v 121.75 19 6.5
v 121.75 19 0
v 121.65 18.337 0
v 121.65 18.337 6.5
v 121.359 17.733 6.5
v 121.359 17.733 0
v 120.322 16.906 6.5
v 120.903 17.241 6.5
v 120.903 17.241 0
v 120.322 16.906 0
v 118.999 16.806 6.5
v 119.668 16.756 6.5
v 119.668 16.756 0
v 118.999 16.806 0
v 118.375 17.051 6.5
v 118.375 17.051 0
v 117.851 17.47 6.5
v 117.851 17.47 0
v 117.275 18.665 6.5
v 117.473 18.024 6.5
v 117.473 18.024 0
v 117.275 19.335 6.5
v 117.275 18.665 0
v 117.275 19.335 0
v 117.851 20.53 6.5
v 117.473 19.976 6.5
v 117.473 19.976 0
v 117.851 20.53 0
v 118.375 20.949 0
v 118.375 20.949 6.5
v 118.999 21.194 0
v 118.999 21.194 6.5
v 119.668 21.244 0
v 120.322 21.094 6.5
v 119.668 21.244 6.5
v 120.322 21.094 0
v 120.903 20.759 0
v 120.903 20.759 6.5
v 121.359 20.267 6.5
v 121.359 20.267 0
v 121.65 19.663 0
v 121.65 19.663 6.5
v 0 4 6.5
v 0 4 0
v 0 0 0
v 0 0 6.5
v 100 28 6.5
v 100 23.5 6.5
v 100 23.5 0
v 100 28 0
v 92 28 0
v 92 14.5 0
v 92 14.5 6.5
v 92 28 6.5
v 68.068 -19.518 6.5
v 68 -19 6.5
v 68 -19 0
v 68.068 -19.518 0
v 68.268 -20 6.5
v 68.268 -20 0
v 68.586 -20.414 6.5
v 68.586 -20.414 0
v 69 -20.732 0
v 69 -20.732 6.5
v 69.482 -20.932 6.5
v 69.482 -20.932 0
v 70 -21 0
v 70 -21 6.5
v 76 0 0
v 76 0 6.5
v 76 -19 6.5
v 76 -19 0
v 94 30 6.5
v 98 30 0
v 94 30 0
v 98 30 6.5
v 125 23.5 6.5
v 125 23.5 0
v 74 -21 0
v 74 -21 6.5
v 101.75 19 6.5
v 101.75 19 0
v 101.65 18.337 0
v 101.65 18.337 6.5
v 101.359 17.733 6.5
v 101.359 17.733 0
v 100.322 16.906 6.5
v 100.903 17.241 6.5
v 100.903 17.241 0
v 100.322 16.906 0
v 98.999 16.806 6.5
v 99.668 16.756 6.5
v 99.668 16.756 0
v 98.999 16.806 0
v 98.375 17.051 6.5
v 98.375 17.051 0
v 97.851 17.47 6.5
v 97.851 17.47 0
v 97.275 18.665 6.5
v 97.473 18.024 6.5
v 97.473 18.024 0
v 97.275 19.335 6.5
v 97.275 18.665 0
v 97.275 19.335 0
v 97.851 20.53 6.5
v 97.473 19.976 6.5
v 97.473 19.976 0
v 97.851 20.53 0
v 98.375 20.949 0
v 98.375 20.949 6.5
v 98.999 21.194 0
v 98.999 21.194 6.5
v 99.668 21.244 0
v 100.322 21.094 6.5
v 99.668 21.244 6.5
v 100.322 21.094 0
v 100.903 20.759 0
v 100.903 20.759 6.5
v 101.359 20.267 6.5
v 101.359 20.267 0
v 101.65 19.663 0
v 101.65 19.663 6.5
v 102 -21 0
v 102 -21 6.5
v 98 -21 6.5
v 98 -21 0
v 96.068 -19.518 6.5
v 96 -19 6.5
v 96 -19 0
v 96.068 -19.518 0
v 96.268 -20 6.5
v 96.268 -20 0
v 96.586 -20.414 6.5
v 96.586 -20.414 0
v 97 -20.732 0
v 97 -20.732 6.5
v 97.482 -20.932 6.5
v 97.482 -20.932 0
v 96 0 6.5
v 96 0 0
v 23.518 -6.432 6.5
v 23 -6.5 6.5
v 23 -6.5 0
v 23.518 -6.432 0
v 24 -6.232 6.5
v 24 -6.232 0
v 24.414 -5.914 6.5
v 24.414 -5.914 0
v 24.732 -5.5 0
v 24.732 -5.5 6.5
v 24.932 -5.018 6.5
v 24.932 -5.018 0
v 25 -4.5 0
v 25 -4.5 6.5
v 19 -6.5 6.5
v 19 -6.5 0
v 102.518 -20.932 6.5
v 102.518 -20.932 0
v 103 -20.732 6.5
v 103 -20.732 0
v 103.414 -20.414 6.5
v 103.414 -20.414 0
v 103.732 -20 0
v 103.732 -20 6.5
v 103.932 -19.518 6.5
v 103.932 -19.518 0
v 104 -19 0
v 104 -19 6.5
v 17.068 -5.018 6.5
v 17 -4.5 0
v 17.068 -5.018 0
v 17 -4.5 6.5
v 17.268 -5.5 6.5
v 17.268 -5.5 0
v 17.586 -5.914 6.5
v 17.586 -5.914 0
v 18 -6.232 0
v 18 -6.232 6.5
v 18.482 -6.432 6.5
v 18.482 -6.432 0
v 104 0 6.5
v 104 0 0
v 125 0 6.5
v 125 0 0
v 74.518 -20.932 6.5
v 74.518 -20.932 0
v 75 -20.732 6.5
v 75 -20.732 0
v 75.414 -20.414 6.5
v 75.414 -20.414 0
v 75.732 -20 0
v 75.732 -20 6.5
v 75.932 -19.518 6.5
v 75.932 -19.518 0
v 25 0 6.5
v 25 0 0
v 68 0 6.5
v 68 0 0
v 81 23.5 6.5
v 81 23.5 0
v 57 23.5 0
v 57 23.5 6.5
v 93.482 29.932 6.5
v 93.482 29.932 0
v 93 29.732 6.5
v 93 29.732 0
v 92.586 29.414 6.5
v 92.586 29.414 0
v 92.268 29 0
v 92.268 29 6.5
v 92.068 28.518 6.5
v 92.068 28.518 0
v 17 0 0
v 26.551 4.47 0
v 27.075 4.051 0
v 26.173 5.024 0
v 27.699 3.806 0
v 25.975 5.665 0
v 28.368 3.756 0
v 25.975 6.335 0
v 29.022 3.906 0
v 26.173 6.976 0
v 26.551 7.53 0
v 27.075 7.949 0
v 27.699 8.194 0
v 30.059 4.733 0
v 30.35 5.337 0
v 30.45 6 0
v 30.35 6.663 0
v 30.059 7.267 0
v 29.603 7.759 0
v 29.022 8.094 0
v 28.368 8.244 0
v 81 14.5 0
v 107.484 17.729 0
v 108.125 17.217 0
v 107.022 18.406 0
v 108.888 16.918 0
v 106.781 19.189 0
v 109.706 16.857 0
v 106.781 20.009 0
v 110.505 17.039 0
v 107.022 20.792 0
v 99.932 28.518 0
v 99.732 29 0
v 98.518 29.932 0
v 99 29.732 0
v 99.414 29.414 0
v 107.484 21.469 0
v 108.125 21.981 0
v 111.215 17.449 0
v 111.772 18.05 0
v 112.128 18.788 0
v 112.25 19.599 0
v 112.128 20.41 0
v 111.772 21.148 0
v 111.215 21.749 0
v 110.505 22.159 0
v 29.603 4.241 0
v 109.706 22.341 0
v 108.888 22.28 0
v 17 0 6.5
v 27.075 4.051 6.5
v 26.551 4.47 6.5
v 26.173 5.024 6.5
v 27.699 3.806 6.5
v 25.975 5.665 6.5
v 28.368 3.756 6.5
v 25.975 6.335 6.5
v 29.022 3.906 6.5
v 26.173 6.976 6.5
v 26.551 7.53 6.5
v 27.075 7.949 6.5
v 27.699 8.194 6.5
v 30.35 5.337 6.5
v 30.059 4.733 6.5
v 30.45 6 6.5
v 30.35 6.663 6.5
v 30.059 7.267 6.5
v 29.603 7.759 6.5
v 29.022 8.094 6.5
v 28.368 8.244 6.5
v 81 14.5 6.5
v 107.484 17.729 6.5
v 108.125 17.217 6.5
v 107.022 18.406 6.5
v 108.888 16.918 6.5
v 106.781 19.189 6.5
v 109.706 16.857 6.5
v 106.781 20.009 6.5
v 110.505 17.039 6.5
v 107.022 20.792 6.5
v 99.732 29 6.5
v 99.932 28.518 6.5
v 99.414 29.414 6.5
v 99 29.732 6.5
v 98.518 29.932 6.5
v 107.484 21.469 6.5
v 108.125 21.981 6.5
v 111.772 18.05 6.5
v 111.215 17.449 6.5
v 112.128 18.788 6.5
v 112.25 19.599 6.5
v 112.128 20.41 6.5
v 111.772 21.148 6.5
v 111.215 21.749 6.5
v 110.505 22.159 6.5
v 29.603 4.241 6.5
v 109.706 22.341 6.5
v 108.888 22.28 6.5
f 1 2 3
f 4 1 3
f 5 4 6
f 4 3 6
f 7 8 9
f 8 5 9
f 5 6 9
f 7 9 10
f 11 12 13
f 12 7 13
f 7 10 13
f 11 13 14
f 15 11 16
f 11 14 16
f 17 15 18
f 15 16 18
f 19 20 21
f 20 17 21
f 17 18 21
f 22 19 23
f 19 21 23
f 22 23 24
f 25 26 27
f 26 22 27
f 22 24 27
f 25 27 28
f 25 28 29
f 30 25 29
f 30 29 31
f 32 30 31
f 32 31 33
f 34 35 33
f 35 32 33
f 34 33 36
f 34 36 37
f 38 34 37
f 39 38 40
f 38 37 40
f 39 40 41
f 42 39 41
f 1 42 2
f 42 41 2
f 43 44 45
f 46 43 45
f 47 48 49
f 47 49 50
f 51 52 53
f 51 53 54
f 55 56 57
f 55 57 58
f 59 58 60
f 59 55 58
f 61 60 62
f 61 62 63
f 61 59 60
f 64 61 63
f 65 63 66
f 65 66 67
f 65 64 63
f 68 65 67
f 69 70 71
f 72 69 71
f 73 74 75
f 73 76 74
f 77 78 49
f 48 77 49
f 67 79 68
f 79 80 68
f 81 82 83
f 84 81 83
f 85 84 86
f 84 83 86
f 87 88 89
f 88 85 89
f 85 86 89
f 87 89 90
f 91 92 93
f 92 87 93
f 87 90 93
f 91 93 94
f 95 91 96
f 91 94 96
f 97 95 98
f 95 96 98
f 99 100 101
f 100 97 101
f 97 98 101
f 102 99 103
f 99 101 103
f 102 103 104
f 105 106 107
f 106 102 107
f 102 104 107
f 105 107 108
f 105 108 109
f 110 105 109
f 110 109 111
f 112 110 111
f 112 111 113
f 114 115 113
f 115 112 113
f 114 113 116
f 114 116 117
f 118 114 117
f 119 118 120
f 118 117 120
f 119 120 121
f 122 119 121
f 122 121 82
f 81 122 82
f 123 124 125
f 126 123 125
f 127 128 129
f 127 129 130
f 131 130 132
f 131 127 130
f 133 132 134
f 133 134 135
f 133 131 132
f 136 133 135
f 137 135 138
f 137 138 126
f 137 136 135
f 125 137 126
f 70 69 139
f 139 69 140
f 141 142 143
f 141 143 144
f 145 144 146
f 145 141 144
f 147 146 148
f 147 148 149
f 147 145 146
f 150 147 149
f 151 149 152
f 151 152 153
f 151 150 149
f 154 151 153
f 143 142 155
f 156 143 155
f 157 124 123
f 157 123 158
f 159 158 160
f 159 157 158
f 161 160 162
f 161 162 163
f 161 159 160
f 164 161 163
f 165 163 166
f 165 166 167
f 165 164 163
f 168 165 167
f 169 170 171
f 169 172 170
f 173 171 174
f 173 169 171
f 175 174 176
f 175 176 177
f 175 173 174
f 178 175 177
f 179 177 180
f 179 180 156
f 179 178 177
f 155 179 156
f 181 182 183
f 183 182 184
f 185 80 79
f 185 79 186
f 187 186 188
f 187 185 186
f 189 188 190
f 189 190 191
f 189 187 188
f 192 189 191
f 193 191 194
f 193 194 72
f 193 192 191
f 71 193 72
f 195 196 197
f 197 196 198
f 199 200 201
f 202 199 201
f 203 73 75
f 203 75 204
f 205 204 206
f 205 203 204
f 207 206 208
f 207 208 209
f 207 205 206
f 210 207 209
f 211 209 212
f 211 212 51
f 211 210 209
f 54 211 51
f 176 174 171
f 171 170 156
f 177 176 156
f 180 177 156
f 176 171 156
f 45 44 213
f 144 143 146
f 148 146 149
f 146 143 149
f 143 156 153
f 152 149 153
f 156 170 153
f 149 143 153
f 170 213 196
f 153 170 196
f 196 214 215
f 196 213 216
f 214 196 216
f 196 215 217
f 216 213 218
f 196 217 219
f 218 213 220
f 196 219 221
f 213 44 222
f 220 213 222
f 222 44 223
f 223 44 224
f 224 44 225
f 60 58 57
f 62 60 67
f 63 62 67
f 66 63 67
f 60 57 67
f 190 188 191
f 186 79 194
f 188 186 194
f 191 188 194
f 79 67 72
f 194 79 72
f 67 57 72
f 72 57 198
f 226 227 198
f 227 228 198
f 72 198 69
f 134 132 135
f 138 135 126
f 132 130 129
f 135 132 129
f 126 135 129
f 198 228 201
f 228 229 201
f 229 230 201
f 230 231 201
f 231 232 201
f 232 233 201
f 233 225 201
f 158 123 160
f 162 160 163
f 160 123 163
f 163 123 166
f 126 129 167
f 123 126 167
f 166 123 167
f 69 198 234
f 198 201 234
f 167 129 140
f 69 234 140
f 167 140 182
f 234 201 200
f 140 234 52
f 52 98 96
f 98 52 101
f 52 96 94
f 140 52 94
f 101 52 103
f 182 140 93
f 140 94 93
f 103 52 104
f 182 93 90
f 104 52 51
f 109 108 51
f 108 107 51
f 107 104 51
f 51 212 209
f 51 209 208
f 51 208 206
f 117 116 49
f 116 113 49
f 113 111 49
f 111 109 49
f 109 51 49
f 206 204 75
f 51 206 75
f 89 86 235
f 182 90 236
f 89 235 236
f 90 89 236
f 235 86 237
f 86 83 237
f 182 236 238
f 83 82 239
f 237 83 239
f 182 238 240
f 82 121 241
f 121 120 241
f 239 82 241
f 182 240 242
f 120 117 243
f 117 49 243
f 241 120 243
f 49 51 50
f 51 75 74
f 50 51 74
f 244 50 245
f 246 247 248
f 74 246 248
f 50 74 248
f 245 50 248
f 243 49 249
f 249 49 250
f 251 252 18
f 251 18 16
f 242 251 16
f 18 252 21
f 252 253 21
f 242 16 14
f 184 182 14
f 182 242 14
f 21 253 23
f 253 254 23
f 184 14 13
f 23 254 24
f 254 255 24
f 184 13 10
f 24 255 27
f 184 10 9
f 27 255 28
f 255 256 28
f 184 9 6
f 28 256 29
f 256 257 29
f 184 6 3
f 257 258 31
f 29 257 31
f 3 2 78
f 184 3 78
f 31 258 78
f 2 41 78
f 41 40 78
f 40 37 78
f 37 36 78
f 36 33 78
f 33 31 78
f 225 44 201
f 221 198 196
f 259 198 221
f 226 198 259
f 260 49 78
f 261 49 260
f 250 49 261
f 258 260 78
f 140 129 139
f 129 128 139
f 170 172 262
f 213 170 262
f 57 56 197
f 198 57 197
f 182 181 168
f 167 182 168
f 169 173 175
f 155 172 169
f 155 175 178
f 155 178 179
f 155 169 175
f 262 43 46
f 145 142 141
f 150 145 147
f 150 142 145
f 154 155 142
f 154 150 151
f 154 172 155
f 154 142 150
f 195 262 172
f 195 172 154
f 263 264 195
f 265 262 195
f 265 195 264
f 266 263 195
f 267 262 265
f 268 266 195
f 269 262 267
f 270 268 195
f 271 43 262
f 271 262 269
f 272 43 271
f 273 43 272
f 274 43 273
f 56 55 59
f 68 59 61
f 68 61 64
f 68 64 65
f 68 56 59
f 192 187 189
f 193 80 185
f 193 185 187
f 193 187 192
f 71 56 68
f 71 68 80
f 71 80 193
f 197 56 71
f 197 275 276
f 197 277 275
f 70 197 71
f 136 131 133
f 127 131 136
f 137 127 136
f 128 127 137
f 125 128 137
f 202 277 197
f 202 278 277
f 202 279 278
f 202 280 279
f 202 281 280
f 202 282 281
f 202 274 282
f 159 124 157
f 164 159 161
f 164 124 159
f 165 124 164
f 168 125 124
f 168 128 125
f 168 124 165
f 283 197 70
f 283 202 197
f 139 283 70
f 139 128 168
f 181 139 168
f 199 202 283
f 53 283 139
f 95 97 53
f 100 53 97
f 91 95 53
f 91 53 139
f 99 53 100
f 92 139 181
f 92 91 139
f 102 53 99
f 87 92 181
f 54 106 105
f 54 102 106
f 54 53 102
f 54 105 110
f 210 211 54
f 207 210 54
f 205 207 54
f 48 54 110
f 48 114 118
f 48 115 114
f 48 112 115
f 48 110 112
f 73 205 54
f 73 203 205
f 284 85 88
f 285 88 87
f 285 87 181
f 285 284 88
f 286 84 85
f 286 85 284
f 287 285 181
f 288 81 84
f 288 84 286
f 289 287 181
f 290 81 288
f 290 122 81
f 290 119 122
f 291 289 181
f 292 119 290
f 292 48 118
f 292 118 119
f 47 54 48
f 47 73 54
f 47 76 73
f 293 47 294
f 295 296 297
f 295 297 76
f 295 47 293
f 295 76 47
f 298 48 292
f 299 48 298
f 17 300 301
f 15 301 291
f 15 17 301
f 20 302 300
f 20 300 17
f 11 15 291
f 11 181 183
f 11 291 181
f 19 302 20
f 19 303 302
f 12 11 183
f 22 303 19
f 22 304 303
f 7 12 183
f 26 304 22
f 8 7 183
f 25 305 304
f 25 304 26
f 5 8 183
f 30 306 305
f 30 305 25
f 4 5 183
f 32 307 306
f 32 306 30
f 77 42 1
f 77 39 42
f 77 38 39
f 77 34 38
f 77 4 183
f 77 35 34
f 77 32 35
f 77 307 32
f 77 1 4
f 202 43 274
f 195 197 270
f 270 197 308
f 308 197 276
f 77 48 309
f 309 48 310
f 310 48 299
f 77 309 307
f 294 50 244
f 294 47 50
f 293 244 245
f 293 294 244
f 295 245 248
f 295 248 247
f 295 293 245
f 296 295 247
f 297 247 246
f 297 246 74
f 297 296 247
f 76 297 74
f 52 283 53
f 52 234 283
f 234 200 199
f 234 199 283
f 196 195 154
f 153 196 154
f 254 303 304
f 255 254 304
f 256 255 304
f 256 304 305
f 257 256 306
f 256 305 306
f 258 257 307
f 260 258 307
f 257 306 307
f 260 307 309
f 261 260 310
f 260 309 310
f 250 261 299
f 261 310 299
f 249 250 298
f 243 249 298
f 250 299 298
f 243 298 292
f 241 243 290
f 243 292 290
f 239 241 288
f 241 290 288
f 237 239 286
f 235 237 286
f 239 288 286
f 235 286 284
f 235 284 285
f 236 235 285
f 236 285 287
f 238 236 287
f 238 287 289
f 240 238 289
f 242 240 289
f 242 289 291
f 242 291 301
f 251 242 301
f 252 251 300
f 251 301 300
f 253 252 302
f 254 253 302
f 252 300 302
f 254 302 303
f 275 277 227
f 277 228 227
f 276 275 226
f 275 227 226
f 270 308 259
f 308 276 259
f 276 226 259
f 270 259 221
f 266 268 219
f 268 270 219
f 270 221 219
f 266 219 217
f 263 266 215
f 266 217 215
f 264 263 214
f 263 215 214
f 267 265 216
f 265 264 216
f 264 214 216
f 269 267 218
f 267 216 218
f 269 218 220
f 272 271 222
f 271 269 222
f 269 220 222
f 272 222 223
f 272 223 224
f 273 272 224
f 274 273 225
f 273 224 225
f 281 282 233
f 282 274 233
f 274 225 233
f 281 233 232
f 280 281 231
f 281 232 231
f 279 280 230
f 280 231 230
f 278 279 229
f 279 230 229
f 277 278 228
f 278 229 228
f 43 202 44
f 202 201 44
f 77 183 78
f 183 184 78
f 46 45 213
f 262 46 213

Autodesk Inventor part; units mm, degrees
ref_plane "YZ Plane" through (0, 0, 0) normal (1, 0, 0) x (0, 1, 0)
ref_plane "XZ Plane" through (0, 0, 0) normal (0, 1, 0) x (-1, 0, 0)
ref_plane "XY Plane" through (0, 0, 0) normal (0, 0, 1) x (1, 0, 0)
sketch "Sketch1" plane through (0, 0, 0) normal (0, 0, 1) x (1, 0, 0)
  line L0 (0, 4) -> (0, 0)
  line L1 (0, 0) -> (125, 0)
  line L2 (125, 0) -> (125, 23.5)
  line L3 (57, 23.5) -> (0, 4)
  line L4 (81, 23.5) -> (81, 14.5)
  line L5 (81, 14.5) -> (92, 14.5)
  line L6 (92, 14.5) -> (92, 23.5)
  line L7 (125, 23.5) -> (92, 23.5)
  line L8 (81, 23.5) -> (57, 23.5)
  circle A0 centre (99.5, 19) radius 2.25
  circle A1 centre (119.5, 19) radius 2.25
  circle A2 centre (28.2, 6) radius 2.25
  circle A3 centre (28.2, 6) radius 4.5 construction
  point P0 (92, 19)
  dimension "d0" = 4
  dimension "d1" = 125
  dimension "d2" = 9
  dimension "d3" = 11
  dimension "d4" = 33
  dimension "d5" = 24
  dimension "d6" = 23.5
  dimension "d7" = 4.5
  dimension "d8" = 4.5
  dimension "d9" = 5.5
  dimension "d10" = 20
  dimension "d11" = 4.5
  dimension "d12" = 9
  dimension "d13" = 6
  dimension "d14" = 28.2
extrude "Extrusion1" add sketch "Sketch1" along normal blind 6.5
sketch "Sketch2" plane through (0, 0, 6.5) normal (0, 0, 1) x (1, 0, 0)
  line L0 (0, 0) -> (125, 0) projected
  line L1 (125, 23.5) -> (92, 23.5) projected
  line L2 (17, 0) -> (25, 0)
  line L3 (25, 0) -> (25, -4.5)
  line L4 (23, -6.5) -> (19, -6.5)
  line L5 (17, -4.5) -> (17, 0)
  line L6 (96, 0) -> (104, 0)
  line L7 (104, 0) -> (104, -19)
  line L8 (102, -21) -> (98, -21)
  line L9 (96, -19) -> (96, 0)
  line L10 (68, 0) -> (76, 0)
  line L11 (76, 0) -> (76, -19)
  line L12 (74, -21) -> (70, -21)
  line L13 (68, -19) -> (68, 0)
  line L14 (92, 23.5) -> (100, 23.5)
  line L15 (100, 23.5) -> (100, 28)
  line L16 (98, 30) -> (94, 30)
  line L17 (92, 28) -> (92, 23.5)
  arc A0 (17, -4.5) -> (19, -6.5) centre (19, -4.5) ccw
  arc A1 (23, -6.5) -> (25, -4.5) centre (23, -4.5) ccw
  arc A2 (96, -19) -> (98, -21) centre (98, -19) ccw
  arc A3 (102, -21) -> (104, -19) centre (102, -19) ccw
  arc A4 (68, -19) -> (70, -21) centre (70, -19) ccw
  arc A5 (74, -21) -> (76, -19) centre (74, -19) ccw
  arc A6 (94, 30) -> (92, 28) centre (94, 28) ccw
  arc A7 (100, 28) -> (98, 30) centre (98, 28) ccw
  line L18 (92, 23.5) -> (92, 14.5) projected
  dimension "d17" = 2
  dimension "d18" = 17
  dimension "d20" = 8
  dimension "d21" = 8
  dimension "d22" = 8
  dimension "d24" = 6.5
  dimension "d25" = 43
  dimension "d26" = 20
  dimension "d29" = 8
  dimension "d40" = 6.5
  dimension "d41" = 2
  dimension "d42" = 2
  dimension "d45" = 21
sketch "Sketch3" plane through (0, 0, 6.5) normal (0, 0, 1) x (1, 0, 0)
  circle A0 centre (119.5, 19) radius 2.25 projected
  circle A1 centre (109.5, 19.599) radius 2.75
  circle A2 centre (86.5, 19.599) radius 7.5 construction
  dimension "d35" = 5.5
  dimension "d36" = 15
  dimension "d37" = 10
extrude "Extrusion3" cut sketch "Sketch3" against normal blind 6.5 contours A1
extrude "Extrusion4" add sketch "Sketch2" against normal blind 6.5
properties part number "x_motor_upper_nut_stop"
